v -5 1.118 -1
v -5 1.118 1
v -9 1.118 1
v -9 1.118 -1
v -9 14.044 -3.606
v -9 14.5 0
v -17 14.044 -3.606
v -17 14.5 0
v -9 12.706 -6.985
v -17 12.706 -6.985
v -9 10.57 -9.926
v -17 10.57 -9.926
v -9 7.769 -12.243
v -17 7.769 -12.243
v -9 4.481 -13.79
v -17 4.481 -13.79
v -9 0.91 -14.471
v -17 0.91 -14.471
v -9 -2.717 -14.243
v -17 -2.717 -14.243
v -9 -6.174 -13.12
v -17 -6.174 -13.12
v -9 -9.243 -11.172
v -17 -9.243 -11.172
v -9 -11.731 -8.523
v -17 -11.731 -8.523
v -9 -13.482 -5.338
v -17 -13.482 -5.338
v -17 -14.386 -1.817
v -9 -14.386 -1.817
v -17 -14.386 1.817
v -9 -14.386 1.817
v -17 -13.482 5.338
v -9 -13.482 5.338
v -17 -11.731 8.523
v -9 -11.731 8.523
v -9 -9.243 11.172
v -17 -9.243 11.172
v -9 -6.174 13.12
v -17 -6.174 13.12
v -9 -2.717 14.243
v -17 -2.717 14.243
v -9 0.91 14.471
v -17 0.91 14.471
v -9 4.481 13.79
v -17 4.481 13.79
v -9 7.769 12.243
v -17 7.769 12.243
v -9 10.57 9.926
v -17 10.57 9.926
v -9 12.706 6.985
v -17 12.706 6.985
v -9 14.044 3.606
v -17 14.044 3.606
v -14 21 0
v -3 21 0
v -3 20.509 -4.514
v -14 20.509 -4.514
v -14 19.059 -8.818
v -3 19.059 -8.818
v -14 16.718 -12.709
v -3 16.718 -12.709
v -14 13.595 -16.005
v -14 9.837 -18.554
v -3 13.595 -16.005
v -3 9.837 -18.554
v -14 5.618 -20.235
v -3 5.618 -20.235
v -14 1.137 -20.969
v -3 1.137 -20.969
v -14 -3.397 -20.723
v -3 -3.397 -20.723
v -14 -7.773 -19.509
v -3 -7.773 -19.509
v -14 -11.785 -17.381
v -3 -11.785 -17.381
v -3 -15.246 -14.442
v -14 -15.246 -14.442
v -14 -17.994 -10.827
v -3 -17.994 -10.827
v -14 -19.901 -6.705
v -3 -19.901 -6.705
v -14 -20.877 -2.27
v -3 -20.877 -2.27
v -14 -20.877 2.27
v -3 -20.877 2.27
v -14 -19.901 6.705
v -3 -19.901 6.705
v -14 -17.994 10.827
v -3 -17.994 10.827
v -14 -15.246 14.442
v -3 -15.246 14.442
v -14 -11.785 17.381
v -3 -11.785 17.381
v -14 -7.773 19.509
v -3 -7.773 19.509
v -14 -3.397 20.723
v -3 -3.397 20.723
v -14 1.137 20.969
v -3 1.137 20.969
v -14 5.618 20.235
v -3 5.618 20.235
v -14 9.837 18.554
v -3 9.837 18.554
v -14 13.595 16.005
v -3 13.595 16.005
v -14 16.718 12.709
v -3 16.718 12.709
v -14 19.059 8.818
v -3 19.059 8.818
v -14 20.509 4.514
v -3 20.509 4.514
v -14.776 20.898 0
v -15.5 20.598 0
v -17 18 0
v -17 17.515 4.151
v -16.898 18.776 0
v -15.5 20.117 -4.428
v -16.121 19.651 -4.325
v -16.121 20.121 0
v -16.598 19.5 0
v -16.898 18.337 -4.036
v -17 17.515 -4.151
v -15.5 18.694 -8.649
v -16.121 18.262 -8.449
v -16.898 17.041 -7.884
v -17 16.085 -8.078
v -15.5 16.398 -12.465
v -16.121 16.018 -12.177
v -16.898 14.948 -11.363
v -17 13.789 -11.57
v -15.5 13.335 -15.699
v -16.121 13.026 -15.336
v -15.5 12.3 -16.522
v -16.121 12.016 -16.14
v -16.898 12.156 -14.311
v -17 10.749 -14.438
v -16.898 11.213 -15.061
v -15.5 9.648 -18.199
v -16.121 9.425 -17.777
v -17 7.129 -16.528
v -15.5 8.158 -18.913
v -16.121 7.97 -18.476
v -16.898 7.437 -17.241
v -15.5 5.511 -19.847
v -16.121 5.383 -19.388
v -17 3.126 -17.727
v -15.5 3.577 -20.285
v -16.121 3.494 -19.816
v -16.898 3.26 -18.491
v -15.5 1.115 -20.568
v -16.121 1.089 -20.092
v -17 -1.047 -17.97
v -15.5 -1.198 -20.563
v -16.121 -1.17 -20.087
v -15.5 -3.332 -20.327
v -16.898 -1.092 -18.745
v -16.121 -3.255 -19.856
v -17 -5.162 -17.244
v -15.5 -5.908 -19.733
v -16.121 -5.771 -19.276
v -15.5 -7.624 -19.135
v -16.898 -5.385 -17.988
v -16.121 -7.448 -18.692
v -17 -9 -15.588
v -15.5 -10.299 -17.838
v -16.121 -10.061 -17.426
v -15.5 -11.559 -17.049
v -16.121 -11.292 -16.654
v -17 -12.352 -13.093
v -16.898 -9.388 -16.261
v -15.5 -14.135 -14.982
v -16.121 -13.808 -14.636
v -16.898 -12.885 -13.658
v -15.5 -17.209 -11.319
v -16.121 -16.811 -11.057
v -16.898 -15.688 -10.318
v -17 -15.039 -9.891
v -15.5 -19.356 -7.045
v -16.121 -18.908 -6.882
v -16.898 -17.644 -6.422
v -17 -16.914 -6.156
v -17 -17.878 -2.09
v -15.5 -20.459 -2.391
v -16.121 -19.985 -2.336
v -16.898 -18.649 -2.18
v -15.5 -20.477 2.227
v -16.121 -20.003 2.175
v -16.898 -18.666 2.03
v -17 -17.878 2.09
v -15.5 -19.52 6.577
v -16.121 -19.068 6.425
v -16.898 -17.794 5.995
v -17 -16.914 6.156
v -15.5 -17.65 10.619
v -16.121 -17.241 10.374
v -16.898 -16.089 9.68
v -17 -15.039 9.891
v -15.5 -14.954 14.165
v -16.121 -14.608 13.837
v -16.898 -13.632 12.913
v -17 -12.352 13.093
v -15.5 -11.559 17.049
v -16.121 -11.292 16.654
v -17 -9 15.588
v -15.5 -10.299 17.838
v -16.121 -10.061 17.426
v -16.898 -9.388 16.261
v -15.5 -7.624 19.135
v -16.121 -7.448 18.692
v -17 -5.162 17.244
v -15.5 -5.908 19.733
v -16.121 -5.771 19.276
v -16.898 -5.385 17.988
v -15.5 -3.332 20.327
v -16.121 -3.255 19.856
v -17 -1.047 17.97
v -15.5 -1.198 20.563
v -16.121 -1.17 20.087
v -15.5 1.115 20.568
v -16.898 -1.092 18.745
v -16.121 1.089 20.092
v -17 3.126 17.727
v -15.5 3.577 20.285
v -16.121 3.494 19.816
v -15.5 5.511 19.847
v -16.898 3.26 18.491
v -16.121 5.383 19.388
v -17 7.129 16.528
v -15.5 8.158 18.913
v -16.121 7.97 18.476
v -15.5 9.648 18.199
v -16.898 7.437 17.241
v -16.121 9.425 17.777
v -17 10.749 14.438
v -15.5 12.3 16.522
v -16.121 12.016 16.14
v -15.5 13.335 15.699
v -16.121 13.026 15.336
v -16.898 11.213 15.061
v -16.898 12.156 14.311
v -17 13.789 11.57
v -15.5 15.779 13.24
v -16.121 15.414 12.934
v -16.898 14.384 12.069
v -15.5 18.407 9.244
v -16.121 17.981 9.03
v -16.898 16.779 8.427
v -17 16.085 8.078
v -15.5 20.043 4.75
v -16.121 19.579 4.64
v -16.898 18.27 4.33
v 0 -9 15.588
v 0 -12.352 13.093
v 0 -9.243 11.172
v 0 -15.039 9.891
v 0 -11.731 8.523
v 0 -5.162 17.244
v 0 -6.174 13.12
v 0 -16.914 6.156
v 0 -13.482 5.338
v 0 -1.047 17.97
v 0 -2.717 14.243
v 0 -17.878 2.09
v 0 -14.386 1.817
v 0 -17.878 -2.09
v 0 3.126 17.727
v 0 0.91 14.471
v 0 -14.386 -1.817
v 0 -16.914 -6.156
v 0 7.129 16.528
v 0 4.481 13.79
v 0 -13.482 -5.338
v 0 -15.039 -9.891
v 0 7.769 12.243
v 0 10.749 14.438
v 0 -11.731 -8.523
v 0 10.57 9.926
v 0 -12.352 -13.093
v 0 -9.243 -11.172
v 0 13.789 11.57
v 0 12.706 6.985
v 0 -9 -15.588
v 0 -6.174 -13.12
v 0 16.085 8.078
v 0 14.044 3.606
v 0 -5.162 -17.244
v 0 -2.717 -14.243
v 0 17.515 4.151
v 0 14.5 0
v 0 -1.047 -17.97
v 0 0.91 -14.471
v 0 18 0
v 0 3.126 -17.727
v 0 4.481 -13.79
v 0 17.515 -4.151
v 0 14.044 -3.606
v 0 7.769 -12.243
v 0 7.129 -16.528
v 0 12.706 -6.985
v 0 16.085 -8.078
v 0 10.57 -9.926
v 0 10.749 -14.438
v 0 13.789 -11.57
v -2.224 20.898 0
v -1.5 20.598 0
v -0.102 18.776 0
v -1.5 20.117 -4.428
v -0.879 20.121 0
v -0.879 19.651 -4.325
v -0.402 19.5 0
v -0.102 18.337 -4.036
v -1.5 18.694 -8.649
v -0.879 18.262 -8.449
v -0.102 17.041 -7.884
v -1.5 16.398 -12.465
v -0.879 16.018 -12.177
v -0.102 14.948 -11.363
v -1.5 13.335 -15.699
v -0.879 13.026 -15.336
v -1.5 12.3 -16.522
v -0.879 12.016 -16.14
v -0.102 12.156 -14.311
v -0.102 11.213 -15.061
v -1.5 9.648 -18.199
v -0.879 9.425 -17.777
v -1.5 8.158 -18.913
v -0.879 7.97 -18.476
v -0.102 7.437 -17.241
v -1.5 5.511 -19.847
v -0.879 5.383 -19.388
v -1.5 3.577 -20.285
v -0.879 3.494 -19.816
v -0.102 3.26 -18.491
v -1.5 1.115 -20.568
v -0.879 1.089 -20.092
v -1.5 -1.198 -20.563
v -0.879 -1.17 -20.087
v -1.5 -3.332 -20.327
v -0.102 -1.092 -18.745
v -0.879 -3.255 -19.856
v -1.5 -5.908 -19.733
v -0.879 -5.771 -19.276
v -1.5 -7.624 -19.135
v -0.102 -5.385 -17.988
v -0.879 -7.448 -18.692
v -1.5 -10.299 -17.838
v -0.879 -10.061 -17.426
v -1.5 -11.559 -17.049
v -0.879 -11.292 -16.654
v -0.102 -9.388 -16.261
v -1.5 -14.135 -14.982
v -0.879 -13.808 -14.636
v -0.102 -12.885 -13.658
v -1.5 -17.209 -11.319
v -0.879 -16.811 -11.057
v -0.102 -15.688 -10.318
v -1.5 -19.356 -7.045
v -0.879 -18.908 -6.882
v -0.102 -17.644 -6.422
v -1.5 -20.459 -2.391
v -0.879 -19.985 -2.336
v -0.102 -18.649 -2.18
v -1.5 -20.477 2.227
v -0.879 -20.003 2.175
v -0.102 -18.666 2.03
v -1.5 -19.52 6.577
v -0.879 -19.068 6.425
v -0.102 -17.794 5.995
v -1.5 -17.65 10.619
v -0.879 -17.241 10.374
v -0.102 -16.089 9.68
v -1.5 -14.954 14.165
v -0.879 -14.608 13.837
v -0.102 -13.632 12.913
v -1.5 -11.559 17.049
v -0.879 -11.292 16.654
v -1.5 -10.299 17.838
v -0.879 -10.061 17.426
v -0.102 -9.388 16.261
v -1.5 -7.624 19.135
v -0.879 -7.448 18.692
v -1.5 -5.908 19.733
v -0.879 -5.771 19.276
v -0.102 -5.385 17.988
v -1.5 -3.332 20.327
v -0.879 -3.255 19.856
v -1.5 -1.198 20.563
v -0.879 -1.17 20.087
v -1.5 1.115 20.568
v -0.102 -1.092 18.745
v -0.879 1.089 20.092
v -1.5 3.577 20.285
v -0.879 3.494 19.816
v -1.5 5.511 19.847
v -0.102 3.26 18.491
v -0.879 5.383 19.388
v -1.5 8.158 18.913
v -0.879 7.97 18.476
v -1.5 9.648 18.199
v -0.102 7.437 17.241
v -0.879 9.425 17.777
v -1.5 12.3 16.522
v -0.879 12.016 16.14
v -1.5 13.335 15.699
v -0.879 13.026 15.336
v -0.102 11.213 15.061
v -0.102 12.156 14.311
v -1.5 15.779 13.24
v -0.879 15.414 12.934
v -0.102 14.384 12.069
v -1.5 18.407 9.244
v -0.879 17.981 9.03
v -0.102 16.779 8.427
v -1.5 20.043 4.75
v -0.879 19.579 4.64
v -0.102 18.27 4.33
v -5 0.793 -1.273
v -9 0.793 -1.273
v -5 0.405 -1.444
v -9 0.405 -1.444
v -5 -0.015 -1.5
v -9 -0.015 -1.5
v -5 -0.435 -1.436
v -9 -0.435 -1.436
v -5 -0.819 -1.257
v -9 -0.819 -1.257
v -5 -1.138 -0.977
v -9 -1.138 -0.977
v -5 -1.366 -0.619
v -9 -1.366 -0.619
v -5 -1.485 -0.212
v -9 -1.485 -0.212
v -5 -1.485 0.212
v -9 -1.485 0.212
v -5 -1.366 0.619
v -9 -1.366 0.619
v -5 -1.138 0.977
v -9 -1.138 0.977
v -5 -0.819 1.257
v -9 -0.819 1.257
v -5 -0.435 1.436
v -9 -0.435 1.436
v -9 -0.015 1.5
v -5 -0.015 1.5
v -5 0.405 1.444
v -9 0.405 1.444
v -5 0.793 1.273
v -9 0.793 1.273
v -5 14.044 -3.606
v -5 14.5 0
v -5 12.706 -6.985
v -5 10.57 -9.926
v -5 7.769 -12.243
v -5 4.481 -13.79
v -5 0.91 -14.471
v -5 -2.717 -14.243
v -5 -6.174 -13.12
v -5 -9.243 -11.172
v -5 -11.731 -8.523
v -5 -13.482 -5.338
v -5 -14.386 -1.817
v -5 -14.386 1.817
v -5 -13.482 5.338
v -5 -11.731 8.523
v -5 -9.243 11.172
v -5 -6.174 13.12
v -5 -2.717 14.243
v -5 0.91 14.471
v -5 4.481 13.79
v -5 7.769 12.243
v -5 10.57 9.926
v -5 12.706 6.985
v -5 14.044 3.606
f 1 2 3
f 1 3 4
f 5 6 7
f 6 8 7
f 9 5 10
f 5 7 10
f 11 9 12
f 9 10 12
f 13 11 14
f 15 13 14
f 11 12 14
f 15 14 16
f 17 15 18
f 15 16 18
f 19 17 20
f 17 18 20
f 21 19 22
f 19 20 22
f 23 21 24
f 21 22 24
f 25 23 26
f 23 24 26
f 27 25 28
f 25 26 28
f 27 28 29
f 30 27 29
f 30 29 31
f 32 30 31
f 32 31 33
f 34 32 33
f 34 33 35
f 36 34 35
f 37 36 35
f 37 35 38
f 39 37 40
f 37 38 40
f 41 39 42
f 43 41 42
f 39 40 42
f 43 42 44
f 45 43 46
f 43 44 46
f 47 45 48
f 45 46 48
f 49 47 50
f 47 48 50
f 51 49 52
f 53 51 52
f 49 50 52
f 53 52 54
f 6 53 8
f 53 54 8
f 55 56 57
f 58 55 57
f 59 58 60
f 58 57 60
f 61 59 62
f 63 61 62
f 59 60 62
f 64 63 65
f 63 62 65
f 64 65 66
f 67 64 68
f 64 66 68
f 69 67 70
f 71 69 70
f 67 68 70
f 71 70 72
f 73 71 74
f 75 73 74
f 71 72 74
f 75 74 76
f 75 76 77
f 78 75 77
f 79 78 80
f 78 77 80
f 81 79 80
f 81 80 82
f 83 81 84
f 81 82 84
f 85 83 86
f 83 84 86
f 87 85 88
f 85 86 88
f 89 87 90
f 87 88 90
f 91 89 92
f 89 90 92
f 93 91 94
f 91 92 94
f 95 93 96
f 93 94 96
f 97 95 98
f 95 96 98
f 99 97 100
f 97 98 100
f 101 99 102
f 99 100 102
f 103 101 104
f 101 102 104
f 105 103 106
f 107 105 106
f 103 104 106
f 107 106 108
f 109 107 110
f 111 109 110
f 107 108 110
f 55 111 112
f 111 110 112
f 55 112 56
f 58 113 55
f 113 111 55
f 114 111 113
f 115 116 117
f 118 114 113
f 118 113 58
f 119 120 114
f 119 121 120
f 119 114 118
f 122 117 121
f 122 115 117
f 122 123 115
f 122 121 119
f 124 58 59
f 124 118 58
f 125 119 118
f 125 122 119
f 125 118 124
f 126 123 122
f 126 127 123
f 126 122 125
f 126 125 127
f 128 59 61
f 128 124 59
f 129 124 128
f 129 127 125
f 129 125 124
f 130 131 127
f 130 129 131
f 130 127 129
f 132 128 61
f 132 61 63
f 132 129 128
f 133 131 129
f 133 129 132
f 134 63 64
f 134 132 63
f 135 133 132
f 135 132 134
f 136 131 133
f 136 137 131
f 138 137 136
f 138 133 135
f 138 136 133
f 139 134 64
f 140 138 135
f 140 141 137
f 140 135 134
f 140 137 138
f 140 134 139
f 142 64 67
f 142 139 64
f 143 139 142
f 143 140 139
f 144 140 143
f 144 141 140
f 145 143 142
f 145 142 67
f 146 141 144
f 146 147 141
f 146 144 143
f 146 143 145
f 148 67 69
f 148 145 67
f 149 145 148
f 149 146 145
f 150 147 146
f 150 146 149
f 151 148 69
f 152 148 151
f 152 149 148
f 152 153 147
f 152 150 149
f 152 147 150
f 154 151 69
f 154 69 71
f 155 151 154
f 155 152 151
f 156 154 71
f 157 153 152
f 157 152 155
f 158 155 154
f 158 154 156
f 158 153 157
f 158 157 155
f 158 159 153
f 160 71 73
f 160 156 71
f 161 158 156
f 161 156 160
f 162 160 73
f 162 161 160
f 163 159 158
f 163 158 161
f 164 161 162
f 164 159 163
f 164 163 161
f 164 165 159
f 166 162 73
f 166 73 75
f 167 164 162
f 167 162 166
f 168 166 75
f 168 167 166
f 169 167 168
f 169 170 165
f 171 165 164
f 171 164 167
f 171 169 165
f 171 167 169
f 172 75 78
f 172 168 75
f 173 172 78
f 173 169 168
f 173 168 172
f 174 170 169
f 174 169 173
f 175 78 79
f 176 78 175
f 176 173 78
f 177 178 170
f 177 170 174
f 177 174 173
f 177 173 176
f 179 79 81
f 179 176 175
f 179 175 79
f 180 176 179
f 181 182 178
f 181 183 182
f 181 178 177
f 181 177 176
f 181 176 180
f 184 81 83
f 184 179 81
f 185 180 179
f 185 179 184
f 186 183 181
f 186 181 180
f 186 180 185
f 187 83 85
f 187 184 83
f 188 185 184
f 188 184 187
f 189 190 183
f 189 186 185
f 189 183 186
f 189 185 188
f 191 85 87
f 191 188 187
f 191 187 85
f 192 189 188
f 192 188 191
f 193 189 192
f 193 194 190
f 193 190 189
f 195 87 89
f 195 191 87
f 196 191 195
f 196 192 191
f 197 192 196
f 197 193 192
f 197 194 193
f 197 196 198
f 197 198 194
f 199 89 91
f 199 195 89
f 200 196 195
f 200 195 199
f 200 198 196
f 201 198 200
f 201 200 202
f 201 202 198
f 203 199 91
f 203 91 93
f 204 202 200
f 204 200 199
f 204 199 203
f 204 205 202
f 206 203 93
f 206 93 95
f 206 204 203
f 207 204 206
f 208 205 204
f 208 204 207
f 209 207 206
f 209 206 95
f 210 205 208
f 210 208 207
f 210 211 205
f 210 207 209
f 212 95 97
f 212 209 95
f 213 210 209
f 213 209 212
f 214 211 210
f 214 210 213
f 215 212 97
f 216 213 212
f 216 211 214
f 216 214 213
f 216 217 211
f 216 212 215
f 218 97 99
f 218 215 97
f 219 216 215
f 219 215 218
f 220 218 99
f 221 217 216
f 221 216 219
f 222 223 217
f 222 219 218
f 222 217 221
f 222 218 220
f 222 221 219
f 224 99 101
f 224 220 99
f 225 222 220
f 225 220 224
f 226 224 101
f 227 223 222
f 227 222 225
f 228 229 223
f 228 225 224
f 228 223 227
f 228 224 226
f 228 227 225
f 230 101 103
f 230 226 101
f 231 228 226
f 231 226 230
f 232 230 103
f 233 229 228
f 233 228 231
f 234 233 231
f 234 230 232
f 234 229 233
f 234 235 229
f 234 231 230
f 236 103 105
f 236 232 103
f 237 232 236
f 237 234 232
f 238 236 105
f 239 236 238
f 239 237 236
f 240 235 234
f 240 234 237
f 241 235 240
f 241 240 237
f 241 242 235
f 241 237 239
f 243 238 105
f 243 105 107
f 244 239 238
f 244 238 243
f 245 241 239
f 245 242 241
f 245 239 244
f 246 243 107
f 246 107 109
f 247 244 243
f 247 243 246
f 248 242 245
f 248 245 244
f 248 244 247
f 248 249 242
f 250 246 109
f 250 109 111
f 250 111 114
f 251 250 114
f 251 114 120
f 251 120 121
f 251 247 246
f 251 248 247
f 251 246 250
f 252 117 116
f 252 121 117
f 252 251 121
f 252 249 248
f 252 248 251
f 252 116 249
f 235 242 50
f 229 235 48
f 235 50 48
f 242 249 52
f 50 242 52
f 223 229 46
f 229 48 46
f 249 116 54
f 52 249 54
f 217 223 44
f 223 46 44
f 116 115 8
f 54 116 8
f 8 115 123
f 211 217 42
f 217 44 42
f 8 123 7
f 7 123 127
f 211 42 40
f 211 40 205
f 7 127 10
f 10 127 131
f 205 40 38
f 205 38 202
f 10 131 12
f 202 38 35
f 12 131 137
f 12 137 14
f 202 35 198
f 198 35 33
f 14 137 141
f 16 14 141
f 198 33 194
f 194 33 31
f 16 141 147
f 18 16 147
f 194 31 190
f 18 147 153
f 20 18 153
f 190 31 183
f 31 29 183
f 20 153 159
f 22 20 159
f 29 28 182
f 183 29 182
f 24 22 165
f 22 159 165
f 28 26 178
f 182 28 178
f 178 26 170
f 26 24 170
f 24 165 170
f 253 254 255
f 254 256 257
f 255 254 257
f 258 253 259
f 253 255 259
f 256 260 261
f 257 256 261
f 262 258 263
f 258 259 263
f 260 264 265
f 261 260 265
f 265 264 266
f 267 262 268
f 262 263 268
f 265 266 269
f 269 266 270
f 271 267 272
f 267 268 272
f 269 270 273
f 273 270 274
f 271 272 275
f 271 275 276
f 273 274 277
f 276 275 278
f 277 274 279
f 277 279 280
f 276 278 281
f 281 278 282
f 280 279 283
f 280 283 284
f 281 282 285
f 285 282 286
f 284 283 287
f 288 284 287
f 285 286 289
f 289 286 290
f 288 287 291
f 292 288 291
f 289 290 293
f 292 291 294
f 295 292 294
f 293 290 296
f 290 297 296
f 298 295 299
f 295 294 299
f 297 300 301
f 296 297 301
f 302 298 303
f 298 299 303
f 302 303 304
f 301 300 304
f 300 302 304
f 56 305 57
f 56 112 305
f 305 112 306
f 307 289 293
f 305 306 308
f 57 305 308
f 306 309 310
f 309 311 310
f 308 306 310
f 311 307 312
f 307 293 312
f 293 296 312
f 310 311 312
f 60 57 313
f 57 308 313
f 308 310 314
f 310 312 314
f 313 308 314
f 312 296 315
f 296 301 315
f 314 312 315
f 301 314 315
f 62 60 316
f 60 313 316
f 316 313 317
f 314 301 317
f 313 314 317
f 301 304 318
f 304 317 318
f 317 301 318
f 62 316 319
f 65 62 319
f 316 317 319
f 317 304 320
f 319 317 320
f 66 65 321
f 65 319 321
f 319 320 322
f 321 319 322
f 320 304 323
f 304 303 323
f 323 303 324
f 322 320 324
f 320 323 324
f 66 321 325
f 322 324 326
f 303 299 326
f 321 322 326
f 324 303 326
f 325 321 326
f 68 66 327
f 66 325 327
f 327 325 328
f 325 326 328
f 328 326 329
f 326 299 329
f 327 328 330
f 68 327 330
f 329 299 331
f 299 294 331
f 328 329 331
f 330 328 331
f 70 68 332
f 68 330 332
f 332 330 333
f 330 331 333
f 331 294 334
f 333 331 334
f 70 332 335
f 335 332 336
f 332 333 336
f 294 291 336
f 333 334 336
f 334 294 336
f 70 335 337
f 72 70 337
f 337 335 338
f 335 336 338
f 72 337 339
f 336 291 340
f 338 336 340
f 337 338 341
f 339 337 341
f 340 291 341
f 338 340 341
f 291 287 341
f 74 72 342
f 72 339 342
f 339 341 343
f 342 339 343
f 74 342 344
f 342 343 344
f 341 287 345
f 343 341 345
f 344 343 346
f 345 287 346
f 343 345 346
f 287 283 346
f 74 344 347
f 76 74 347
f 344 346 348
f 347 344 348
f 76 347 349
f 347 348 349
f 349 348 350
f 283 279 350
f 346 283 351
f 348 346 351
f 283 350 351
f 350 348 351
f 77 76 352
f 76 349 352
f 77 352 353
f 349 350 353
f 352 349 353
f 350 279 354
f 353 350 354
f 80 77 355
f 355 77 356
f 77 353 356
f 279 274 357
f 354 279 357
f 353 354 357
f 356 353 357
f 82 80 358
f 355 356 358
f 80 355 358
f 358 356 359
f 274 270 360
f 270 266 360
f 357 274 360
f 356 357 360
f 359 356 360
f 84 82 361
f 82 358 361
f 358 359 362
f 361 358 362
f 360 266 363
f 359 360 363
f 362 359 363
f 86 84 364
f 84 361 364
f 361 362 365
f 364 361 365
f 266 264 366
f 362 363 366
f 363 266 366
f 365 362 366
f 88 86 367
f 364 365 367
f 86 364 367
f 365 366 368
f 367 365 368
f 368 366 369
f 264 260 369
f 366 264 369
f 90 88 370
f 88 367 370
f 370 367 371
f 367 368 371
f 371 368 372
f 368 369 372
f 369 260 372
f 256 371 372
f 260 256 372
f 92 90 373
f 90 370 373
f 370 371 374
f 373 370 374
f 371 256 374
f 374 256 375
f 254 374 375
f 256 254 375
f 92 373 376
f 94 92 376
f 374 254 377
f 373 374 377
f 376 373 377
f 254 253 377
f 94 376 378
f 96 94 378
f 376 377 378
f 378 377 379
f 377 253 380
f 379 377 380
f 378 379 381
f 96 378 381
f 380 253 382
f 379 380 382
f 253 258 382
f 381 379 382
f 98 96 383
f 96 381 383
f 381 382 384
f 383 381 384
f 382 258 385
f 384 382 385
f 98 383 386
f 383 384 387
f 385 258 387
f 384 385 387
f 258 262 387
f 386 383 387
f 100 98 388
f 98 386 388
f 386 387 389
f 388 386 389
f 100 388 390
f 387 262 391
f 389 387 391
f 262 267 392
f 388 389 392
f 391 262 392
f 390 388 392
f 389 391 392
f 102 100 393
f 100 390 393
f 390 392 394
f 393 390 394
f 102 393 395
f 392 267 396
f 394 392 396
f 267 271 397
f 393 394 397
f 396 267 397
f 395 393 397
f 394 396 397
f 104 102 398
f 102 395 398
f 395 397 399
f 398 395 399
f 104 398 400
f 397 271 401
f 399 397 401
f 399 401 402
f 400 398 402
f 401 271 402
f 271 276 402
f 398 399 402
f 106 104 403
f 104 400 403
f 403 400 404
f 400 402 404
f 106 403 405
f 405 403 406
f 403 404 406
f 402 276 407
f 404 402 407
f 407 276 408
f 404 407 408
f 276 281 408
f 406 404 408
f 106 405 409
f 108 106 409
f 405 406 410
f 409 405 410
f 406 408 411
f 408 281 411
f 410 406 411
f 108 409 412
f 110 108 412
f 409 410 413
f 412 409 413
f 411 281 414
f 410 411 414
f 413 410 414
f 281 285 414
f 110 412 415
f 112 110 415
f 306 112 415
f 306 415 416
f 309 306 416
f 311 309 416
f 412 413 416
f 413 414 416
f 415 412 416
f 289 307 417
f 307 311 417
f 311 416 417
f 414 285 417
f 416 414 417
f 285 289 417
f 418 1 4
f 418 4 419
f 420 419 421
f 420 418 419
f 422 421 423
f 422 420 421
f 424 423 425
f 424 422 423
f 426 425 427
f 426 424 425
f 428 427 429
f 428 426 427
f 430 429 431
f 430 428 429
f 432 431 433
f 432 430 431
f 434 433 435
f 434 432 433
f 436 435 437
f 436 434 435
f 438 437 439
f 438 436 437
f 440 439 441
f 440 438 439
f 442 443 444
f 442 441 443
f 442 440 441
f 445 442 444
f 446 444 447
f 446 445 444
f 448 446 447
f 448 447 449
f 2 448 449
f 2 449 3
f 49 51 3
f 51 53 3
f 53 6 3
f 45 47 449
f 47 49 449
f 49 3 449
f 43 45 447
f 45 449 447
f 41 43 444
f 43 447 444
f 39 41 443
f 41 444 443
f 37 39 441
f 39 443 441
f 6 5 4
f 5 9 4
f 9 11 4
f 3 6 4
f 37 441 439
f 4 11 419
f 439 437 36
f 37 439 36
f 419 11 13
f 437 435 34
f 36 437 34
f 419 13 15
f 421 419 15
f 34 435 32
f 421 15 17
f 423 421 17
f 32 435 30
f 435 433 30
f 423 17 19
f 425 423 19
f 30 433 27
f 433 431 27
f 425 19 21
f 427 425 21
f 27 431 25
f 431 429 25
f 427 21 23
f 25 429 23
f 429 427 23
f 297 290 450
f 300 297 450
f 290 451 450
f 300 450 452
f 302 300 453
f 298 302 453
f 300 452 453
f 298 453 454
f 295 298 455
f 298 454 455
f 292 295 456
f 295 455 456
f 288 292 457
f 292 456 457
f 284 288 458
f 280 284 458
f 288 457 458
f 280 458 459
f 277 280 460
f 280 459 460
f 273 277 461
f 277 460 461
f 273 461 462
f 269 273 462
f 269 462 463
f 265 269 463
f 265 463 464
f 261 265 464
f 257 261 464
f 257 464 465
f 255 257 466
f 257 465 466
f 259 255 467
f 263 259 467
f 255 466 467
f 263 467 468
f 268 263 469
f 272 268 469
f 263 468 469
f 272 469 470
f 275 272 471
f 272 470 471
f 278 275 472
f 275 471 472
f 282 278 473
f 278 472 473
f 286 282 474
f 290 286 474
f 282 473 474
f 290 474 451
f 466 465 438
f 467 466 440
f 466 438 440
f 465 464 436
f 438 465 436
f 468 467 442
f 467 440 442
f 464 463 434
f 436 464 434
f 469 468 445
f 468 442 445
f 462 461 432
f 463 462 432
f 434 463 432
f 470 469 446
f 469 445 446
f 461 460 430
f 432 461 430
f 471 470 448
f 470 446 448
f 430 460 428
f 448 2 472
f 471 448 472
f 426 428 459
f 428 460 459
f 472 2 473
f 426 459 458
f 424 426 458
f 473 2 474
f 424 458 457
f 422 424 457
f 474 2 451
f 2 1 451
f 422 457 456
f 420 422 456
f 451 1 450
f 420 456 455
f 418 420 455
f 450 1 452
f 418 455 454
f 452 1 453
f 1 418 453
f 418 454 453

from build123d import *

# Parameters (mm, degrees)
CONG_1_R                = 3
ENL_V_MAT_EXTRU_1_REACH = 34.031


with BuildPart() as part:
    # Esquisse1 → Révolution1 (revolve)
    with BuildSketch(Plane.XY):
        Polygon((-17, 21), (0, 21), (0, 14.5), (-5, 14.5), (-5, 0), (-9, 0), (-9, 14.5), (-17, 14.5), align=None)
    revolve(axis=Axis((-5, 0, 0), (-1, 0, 0)))

    # Congé1
    cong_1_edges = [part.edges().sort_by_distance(p)[0] for p in [
        (-17, -21, 0),
        (0, -21, 0),
    ]]
    fillet(cong_1_edges, radius=CONG_1_R)

    # Esquisse2 → Enlèv. mat.-Extru.1 (cut, up to next)
    with BuildSketch(Plane(origin=(-5, 0, 0), x_dir=(0, 0, -1), z_dir=(1, 0, 0)), mode=Mode.PRIVATE) as enl_v_mat_extru_1_sk1:
        with BuildLine():
            Line((-1, 1.118033989), (1, 1.118033989))
            ThreePointArc((1, 1.118033989), (0, -1.5), (-1, 1.118033989))
        make_face()
    enl_v_mat_extru_1_tool1 = extrude(enl_v_mat_extru_1_sk1.sketch, amount=-ENL_V_MAT_EXTRU_1_REACH, mode=Mode.PRIVATE) & part.part
    add(enl_v_mat_extru_1_tool1.solids().sort_by_distance((-5, -0.101863, 0))[0], mode=Mode.SUBTRACT)


solid = part.part
